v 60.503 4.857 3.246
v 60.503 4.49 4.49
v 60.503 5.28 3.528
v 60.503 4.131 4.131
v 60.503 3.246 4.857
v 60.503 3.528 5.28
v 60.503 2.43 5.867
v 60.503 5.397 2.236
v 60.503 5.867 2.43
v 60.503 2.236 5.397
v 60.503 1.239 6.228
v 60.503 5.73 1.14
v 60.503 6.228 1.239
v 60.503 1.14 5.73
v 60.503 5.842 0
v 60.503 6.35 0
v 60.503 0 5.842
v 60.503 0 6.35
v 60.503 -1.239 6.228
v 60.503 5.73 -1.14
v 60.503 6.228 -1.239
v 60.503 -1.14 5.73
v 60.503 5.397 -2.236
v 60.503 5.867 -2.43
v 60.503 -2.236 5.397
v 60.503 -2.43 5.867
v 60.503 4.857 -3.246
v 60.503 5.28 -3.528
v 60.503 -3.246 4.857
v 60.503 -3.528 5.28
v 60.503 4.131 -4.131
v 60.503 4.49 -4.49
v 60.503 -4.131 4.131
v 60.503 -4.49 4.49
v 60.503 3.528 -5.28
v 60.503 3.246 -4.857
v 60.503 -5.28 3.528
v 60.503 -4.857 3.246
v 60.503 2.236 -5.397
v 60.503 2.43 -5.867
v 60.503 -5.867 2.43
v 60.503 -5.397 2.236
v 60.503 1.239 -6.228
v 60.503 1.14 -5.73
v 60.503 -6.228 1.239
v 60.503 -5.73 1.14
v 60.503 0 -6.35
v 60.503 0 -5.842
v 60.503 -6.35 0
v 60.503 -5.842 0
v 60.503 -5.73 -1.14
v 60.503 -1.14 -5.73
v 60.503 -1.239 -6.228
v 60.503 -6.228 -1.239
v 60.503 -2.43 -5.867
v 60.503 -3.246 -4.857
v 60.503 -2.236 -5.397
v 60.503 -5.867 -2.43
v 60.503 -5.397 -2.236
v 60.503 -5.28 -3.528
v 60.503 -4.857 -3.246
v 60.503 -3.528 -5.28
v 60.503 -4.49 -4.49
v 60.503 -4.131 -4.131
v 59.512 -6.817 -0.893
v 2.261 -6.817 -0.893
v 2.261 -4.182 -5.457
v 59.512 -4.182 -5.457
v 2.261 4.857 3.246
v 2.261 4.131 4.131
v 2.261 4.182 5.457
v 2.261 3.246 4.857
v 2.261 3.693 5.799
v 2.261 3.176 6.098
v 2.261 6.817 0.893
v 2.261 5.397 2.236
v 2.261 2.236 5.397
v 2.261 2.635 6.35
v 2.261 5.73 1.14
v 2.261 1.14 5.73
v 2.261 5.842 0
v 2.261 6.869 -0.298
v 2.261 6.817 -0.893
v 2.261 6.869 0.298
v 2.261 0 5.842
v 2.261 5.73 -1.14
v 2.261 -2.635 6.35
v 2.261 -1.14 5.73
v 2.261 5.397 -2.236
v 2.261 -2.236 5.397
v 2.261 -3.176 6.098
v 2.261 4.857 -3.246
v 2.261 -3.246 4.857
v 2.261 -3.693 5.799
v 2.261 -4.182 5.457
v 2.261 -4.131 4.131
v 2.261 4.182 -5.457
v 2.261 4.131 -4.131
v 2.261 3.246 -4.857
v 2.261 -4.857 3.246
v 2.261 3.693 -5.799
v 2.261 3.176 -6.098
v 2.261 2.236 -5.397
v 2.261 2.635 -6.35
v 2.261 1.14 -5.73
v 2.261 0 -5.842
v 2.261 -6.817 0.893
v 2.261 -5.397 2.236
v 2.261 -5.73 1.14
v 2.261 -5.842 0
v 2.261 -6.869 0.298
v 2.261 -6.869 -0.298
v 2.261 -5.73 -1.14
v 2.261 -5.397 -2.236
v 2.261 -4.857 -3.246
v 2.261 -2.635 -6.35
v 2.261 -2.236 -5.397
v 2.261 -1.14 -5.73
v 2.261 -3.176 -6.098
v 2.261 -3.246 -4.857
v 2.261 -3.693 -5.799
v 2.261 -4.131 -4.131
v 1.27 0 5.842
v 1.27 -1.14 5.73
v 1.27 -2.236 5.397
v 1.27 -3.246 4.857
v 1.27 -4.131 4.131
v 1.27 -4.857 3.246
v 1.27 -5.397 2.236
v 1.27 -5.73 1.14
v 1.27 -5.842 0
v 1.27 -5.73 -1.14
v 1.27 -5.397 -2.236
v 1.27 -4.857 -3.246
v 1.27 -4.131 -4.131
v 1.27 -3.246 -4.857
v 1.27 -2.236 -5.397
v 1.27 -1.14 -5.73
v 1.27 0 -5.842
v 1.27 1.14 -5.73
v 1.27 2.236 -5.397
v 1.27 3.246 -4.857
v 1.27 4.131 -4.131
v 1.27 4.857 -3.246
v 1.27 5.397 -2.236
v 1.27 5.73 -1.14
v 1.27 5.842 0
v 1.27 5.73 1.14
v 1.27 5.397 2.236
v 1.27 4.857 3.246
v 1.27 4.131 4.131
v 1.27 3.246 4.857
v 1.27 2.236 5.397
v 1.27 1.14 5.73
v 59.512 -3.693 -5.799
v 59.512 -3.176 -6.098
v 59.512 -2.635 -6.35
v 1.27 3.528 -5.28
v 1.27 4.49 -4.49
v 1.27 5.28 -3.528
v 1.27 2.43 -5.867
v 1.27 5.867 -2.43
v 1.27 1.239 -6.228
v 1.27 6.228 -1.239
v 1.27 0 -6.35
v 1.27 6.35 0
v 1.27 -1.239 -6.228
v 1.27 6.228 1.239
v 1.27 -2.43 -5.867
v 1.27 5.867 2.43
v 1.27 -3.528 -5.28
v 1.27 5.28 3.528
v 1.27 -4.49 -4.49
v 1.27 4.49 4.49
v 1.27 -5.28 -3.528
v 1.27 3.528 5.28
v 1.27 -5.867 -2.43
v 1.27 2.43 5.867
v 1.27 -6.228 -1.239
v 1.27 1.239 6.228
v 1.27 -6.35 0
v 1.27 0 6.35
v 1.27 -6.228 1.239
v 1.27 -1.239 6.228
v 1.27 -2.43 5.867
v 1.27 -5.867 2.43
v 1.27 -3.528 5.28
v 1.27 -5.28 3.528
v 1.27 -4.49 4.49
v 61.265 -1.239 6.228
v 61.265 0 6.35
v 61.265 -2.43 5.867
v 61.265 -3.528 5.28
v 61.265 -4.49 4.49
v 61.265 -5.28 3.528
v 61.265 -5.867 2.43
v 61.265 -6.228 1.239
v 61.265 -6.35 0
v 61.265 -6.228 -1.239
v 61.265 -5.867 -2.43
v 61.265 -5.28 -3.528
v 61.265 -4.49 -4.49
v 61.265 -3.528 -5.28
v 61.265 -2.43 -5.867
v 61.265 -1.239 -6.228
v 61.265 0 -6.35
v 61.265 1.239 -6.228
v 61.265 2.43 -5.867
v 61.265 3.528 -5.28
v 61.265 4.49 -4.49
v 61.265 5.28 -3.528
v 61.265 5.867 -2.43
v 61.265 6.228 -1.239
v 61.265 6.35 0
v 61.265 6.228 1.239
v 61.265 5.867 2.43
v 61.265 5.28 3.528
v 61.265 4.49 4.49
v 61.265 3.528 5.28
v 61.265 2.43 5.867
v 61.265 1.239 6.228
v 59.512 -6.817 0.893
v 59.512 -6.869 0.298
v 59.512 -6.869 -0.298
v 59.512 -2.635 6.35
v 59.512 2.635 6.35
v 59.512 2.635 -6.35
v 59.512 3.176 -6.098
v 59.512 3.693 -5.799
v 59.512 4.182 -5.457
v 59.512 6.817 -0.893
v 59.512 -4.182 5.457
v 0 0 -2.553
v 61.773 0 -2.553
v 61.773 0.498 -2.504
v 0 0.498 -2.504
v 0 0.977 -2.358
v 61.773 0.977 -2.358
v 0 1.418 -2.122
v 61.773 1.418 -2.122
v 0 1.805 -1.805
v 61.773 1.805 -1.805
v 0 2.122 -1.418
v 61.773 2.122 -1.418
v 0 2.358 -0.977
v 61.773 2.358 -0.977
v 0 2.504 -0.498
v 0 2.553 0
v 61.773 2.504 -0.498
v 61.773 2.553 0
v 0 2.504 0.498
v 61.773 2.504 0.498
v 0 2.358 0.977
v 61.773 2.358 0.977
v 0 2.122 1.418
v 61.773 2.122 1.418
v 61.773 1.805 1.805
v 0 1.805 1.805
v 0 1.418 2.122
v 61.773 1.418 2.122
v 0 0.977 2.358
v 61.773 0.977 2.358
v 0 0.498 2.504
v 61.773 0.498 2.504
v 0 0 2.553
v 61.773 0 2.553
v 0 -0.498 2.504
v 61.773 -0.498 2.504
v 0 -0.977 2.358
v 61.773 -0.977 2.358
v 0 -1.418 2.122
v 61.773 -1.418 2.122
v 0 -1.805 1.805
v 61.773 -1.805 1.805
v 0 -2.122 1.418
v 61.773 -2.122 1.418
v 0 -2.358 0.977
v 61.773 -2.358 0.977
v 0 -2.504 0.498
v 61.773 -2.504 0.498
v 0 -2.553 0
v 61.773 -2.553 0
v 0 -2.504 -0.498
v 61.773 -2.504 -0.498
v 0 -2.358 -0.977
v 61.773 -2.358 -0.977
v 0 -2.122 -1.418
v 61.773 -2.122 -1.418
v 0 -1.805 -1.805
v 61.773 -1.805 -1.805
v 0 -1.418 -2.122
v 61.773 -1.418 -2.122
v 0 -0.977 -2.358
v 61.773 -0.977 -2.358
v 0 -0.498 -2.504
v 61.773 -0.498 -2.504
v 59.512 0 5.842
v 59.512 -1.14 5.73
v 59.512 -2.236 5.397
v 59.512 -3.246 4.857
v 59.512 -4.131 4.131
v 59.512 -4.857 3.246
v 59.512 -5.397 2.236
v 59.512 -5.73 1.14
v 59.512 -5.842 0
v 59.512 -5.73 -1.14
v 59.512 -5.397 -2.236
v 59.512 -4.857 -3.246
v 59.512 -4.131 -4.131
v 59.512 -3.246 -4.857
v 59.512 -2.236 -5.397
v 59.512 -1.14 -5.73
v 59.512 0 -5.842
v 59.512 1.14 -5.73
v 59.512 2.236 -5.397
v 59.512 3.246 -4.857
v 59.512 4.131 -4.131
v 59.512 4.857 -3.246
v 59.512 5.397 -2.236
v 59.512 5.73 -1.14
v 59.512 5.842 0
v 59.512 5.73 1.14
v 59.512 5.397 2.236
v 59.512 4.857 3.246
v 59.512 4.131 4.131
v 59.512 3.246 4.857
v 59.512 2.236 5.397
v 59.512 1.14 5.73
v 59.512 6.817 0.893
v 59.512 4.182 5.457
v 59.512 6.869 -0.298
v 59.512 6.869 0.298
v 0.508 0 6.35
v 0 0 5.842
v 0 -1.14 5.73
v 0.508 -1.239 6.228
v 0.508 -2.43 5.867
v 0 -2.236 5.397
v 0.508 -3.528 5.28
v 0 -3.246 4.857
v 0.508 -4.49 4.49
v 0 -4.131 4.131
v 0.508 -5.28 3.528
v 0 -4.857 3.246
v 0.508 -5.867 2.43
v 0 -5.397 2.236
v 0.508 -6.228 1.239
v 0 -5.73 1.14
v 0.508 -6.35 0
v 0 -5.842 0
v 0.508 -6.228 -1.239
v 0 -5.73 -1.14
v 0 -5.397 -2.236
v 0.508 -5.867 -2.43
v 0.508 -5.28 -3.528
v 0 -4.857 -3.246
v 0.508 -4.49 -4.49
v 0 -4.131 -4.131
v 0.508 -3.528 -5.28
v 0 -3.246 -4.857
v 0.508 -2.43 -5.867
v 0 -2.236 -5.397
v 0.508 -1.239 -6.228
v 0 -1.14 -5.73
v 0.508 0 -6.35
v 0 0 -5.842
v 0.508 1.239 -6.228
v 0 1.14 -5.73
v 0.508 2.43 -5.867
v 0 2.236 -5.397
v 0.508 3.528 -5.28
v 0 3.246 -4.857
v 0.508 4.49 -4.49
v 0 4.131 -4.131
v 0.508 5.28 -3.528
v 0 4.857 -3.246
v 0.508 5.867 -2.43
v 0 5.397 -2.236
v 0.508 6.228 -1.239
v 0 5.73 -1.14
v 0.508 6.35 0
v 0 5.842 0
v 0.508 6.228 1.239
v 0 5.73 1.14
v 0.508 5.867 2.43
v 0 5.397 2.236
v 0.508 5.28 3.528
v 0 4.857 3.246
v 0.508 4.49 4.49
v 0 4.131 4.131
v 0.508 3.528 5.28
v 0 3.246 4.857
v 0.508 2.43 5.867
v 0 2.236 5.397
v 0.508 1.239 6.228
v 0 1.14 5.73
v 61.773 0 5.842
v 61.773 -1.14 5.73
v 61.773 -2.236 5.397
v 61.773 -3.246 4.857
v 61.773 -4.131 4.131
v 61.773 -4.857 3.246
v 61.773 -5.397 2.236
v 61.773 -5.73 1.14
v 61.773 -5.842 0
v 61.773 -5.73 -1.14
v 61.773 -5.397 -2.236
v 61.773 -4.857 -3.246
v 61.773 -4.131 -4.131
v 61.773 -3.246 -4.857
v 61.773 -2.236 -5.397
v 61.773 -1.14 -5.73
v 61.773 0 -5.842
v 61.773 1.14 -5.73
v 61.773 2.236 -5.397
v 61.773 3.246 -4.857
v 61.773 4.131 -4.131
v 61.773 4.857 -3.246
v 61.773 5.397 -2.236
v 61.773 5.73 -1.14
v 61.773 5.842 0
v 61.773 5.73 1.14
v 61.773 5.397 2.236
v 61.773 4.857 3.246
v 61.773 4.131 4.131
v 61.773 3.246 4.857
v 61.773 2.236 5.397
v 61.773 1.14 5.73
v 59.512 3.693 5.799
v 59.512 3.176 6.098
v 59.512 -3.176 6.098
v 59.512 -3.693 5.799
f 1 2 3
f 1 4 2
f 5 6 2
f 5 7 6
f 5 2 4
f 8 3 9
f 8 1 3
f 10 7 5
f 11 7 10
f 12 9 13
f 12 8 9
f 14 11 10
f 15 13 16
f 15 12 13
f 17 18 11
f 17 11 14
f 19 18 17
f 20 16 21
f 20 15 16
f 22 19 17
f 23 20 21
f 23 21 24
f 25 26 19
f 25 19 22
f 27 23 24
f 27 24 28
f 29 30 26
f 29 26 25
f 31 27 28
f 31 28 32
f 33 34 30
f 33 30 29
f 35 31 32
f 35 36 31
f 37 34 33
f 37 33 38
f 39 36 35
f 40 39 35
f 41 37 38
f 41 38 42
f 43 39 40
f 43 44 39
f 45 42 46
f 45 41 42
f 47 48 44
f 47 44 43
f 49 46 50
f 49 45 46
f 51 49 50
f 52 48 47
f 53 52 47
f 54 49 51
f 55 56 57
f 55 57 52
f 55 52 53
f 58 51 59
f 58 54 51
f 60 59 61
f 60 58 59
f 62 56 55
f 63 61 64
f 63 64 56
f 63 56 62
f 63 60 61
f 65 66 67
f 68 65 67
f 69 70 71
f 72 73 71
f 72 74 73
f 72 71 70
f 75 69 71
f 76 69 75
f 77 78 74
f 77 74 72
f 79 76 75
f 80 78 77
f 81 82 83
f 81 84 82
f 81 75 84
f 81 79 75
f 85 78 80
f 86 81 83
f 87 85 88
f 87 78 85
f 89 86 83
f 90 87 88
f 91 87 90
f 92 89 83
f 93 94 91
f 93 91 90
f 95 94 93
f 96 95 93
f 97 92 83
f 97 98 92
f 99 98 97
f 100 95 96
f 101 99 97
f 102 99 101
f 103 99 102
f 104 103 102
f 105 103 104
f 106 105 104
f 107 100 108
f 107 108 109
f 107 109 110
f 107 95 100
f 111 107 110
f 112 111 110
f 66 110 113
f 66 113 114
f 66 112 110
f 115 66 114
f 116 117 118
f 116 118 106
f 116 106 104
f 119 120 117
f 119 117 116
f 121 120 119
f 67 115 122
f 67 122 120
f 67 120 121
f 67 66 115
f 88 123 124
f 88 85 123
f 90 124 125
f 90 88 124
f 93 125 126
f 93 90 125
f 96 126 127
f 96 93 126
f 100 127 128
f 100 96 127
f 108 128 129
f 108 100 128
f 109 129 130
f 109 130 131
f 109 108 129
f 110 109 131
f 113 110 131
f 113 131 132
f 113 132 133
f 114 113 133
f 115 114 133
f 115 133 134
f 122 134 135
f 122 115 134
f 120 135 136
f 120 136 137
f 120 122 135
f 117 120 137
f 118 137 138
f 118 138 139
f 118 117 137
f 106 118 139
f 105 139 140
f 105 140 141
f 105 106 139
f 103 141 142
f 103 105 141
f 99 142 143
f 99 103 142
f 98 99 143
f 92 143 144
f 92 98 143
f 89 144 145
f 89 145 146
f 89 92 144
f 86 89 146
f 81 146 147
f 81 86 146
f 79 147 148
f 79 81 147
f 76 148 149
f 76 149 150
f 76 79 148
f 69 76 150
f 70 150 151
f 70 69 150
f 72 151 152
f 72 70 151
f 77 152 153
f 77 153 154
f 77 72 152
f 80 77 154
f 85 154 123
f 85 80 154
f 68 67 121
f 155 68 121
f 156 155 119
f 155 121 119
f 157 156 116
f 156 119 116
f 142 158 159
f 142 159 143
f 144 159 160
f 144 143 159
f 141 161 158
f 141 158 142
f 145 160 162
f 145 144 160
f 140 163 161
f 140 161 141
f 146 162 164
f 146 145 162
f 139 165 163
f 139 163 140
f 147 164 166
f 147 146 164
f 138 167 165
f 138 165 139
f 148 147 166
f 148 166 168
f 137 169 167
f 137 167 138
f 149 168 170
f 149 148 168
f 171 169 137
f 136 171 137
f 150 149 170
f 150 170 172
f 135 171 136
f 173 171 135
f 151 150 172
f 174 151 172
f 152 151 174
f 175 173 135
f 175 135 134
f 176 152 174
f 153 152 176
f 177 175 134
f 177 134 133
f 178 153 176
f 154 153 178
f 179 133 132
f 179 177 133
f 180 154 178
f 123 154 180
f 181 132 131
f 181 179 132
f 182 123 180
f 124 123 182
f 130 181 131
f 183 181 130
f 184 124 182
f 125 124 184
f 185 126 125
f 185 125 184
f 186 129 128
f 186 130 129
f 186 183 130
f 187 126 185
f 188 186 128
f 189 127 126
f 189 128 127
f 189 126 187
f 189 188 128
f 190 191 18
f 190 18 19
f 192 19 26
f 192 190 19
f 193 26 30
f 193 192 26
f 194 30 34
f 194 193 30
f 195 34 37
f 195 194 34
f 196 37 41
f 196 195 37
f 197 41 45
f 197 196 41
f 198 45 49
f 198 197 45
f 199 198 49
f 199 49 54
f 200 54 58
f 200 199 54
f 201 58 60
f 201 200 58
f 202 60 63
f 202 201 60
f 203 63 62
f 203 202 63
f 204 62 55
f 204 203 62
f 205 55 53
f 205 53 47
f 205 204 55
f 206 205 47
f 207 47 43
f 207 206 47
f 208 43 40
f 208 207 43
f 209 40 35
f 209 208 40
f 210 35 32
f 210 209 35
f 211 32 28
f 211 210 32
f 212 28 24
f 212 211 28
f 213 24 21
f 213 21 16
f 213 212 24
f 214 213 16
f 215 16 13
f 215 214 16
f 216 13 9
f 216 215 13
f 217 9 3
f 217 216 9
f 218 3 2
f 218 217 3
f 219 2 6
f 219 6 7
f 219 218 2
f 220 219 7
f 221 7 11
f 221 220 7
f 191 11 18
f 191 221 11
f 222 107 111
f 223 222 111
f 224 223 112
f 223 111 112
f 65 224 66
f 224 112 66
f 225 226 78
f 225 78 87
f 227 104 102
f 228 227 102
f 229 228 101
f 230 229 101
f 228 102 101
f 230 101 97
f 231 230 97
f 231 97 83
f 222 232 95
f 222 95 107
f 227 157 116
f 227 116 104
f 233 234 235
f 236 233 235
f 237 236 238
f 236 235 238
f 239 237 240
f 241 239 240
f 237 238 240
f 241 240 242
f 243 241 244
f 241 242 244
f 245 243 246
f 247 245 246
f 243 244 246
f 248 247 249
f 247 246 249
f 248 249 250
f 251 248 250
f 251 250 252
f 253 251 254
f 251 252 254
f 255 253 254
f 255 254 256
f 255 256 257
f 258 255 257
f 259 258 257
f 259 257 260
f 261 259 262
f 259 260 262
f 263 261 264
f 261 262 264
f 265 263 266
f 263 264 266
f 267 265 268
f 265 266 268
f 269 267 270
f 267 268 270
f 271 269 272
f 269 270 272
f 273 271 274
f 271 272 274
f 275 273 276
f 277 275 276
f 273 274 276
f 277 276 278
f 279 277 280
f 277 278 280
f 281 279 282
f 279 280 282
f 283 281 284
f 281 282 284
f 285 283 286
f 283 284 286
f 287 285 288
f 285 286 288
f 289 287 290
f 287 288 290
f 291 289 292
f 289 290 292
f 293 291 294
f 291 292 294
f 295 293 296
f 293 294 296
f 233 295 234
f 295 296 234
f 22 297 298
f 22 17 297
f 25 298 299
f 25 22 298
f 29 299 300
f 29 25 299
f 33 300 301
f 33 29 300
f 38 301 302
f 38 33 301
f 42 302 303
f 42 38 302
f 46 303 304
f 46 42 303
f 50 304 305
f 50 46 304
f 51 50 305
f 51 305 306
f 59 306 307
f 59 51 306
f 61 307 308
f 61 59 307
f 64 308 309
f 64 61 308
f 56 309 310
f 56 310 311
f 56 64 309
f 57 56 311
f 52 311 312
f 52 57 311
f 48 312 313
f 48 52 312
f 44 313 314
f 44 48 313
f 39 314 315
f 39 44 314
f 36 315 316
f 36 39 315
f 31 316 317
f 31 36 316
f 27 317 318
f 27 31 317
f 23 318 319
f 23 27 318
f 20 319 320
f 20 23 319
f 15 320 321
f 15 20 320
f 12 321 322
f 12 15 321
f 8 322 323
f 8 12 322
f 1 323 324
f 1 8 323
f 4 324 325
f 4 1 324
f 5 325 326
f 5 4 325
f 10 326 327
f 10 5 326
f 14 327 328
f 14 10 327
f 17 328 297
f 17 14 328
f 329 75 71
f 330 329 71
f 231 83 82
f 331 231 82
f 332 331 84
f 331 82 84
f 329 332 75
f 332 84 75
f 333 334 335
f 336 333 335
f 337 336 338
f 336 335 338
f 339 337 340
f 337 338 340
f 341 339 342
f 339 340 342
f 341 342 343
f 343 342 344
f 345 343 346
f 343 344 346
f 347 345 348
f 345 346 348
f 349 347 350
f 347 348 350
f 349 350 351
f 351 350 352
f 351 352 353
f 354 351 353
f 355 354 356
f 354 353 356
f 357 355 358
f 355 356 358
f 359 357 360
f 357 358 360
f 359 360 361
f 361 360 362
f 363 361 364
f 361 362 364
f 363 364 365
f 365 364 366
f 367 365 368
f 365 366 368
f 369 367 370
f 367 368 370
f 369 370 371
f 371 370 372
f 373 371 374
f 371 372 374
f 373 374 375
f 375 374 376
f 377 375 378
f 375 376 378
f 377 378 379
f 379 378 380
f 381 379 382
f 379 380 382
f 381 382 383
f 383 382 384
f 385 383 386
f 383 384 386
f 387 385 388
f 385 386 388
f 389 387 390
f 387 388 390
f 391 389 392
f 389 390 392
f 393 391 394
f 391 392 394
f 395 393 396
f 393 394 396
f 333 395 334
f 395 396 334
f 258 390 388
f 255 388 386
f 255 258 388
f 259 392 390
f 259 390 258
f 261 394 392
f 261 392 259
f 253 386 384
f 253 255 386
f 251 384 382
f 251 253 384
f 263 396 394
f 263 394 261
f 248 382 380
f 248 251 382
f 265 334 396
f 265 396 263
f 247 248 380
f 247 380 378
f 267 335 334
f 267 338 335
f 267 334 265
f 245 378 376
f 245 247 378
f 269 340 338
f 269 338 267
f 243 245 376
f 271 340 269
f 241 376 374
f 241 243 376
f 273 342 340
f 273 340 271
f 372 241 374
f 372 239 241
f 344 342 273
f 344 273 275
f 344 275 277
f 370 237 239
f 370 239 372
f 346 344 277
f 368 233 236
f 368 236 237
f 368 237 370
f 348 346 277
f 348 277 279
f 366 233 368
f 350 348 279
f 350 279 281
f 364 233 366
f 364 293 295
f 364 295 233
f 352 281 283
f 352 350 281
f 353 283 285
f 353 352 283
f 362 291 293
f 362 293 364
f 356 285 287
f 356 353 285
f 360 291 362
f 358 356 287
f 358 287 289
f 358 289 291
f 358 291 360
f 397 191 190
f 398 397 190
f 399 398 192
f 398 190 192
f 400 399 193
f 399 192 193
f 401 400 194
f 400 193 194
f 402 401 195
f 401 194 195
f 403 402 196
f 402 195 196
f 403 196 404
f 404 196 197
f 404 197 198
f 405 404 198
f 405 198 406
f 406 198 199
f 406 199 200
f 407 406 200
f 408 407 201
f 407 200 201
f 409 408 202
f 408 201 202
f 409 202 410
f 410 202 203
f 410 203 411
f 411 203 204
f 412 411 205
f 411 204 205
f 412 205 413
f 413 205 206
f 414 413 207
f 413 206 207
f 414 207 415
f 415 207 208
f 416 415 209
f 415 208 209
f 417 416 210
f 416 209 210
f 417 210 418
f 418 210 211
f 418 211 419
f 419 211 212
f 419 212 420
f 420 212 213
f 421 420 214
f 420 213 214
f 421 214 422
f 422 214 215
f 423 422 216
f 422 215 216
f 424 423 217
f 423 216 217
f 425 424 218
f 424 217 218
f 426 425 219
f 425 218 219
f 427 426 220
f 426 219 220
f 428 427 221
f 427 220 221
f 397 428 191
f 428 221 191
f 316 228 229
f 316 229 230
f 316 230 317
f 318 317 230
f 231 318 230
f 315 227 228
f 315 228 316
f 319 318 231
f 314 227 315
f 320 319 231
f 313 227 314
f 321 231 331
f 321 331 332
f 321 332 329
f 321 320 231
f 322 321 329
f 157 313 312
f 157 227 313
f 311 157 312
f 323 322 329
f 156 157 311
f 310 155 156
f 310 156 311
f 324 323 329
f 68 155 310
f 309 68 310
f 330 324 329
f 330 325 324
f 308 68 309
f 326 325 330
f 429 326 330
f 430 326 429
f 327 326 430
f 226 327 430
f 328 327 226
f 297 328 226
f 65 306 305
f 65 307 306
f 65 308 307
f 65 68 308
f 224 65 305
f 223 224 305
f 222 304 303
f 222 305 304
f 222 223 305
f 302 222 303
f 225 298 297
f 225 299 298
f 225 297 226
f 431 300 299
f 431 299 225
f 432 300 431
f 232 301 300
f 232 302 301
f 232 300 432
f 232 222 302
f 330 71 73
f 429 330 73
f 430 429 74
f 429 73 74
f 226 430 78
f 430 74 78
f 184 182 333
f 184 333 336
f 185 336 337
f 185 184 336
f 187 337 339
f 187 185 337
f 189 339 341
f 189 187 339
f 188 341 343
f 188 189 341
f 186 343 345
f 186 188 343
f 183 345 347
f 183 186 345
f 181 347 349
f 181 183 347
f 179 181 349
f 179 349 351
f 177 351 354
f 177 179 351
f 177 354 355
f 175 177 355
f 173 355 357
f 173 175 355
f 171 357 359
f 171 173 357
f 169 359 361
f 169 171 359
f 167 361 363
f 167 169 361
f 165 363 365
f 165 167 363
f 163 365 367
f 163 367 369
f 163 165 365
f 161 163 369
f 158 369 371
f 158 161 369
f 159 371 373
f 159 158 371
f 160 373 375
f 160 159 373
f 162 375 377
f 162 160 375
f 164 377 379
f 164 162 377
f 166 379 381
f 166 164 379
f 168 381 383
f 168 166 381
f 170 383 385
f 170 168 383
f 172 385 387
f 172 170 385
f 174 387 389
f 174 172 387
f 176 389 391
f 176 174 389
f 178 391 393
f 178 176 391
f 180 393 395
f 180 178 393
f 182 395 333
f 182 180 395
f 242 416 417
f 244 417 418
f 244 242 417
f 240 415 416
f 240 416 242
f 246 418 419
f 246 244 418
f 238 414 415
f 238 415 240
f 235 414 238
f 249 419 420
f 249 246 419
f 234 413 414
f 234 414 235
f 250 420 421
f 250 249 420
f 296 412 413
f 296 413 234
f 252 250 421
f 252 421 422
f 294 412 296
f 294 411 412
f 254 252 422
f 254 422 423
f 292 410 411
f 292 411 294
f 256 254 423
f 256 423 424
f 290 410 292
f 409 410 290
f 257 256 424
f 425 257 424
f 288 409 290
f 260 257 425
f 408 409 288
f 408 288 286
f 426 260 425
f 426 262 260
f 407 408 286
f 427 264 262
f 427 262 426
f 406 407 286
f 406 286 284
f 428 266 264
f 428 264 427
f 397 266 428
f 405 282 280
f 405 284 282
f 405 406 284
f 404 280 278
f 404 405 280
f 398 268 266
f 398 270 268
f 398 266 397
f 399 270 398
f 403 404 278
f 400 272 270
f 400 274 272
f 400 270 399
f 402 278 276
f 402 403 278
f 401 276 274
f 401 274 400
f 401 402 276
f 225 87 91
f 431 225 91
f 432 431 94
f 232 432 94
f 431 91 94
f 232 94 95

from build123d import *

# Parameters (mm, degrees)
CUT_EXTRUDE1_START = 2.2606
SKETCH2_OUTSIDE_W  = 30.324
SKETCH2_OUTSIDE_H  = 30.324
CUT_EXTRUDE1_DEPTH = 57.2516
SKETCH5_R          = 2.5527
CUT_EXTRUDE2_DEPTH = 61.7728
CHAMFER1_SIZE      = 0.508


with BuildPart() as part:
    # Sketch4 → Revolve1 (revolve)
    with BuildSketch(Plane(origin=(0, 0, 0), x_dir=(1, 0, 0), z_dir=(0, 1, 0)), mode=Mode.PRIVATE) as revolve1_sk:
        Polygon((1.27, 6.35), (1.27, 5.842), (2.2606, 5.842), (2.2606, 7.62), (59.5122, 7.62), (59.5122, 5.842), (60.5028, 5.842), (60.5028, 6.35), (61.7728, 6.35), (61.7728, 0), (0, 0), (0, 6.35), align=None)
    revolve(revolve1_sk.sketch.rotate(Axis((0, 0, 0), (1, 0, 0)), 180), axis=Axis((0, 0, 0), (1, 0, 0)))

    # Sketch2 outside → Cut-Extrude1 (cut)
    with BuildSketch(Plane(origin=(0, 0, 0), x_dir=(0, 0, -1), z_dir=(1, 0, 0)).offset(CUT_EXTRUDE1_START)):
        Rectangle(SKETCH2_OUTSIDE_W, SKETCH2_OUTSIDE_H)
        with BuildLine():
            Line((5.456960506, 4.181770802), (0.893039494, 6.816751826))
            ThreePointArc((0.893039494, 6.816751826), (0, 6.875), (-0.893039494, 6.816751826))
            Line((-0.893039494, 6.816751826), (-5.456960506, 4.181770802))
            ThreePointArc((-5.456960506, 4.181770802), (-5.953924651, 3.4375), (-6.35, 2.634981025))
            Line((-6.35, 2.634981025), (-6.35, -2.634981025))
            ThreePointArc((-6.35, -2.634981025), (-5.953924651, -3.4375), (-5.456960506, -4.181770802))
            Line((-5.456960506, -4.181770802), (-0.893039494, -6.816751826))
            ThreePointArc((-0.893039494, -6.816751826), (0, -6.875), (0.893039494, -6.816751826))
            Line((0.893039494, -6.816751826), (5.456960506, -4.181770802))
            ThreePointArc((5.456960506, -4.181770802), (5.953924651, -3.4375), (6.35, -2.634981025))
            Line((6.35, -2.634981025), (6.35, 2.634981025))
            ThreePointArc((6.35, 2.634981025), (5.953924651, 3.4375), (5.456960506, 4.181770802))
        make_face(mode=Mode.SUBTRACT)
    extrude(amount=CUT_EXTRUDE1_DEPTH, mode=Mode.SUBTRACT)

    # Sketch5 → Cut-Extrude2 (cut)
    with BuildSketch(Plane(origin=(61.7728, 0, 0), x_dir=(0, 0, -1), z_dir=(1, 0, 0))):
        Circle(SKETCH5_R)
    extrude(amount=-CUT_EXTRUDE2_DEPTH, mode=Mode.SUBTRACT)

    # Chamfer1
    chamfer1_edges = [part.edges().sort_by_distance(p)[0] for p in [
        (0, 0, -6.35),
        (61.7728, 0, -6.35),
    ]]
    chamfer(chamfer1_edges, length=CHAMFER1_SIZE)


solid = part.part
